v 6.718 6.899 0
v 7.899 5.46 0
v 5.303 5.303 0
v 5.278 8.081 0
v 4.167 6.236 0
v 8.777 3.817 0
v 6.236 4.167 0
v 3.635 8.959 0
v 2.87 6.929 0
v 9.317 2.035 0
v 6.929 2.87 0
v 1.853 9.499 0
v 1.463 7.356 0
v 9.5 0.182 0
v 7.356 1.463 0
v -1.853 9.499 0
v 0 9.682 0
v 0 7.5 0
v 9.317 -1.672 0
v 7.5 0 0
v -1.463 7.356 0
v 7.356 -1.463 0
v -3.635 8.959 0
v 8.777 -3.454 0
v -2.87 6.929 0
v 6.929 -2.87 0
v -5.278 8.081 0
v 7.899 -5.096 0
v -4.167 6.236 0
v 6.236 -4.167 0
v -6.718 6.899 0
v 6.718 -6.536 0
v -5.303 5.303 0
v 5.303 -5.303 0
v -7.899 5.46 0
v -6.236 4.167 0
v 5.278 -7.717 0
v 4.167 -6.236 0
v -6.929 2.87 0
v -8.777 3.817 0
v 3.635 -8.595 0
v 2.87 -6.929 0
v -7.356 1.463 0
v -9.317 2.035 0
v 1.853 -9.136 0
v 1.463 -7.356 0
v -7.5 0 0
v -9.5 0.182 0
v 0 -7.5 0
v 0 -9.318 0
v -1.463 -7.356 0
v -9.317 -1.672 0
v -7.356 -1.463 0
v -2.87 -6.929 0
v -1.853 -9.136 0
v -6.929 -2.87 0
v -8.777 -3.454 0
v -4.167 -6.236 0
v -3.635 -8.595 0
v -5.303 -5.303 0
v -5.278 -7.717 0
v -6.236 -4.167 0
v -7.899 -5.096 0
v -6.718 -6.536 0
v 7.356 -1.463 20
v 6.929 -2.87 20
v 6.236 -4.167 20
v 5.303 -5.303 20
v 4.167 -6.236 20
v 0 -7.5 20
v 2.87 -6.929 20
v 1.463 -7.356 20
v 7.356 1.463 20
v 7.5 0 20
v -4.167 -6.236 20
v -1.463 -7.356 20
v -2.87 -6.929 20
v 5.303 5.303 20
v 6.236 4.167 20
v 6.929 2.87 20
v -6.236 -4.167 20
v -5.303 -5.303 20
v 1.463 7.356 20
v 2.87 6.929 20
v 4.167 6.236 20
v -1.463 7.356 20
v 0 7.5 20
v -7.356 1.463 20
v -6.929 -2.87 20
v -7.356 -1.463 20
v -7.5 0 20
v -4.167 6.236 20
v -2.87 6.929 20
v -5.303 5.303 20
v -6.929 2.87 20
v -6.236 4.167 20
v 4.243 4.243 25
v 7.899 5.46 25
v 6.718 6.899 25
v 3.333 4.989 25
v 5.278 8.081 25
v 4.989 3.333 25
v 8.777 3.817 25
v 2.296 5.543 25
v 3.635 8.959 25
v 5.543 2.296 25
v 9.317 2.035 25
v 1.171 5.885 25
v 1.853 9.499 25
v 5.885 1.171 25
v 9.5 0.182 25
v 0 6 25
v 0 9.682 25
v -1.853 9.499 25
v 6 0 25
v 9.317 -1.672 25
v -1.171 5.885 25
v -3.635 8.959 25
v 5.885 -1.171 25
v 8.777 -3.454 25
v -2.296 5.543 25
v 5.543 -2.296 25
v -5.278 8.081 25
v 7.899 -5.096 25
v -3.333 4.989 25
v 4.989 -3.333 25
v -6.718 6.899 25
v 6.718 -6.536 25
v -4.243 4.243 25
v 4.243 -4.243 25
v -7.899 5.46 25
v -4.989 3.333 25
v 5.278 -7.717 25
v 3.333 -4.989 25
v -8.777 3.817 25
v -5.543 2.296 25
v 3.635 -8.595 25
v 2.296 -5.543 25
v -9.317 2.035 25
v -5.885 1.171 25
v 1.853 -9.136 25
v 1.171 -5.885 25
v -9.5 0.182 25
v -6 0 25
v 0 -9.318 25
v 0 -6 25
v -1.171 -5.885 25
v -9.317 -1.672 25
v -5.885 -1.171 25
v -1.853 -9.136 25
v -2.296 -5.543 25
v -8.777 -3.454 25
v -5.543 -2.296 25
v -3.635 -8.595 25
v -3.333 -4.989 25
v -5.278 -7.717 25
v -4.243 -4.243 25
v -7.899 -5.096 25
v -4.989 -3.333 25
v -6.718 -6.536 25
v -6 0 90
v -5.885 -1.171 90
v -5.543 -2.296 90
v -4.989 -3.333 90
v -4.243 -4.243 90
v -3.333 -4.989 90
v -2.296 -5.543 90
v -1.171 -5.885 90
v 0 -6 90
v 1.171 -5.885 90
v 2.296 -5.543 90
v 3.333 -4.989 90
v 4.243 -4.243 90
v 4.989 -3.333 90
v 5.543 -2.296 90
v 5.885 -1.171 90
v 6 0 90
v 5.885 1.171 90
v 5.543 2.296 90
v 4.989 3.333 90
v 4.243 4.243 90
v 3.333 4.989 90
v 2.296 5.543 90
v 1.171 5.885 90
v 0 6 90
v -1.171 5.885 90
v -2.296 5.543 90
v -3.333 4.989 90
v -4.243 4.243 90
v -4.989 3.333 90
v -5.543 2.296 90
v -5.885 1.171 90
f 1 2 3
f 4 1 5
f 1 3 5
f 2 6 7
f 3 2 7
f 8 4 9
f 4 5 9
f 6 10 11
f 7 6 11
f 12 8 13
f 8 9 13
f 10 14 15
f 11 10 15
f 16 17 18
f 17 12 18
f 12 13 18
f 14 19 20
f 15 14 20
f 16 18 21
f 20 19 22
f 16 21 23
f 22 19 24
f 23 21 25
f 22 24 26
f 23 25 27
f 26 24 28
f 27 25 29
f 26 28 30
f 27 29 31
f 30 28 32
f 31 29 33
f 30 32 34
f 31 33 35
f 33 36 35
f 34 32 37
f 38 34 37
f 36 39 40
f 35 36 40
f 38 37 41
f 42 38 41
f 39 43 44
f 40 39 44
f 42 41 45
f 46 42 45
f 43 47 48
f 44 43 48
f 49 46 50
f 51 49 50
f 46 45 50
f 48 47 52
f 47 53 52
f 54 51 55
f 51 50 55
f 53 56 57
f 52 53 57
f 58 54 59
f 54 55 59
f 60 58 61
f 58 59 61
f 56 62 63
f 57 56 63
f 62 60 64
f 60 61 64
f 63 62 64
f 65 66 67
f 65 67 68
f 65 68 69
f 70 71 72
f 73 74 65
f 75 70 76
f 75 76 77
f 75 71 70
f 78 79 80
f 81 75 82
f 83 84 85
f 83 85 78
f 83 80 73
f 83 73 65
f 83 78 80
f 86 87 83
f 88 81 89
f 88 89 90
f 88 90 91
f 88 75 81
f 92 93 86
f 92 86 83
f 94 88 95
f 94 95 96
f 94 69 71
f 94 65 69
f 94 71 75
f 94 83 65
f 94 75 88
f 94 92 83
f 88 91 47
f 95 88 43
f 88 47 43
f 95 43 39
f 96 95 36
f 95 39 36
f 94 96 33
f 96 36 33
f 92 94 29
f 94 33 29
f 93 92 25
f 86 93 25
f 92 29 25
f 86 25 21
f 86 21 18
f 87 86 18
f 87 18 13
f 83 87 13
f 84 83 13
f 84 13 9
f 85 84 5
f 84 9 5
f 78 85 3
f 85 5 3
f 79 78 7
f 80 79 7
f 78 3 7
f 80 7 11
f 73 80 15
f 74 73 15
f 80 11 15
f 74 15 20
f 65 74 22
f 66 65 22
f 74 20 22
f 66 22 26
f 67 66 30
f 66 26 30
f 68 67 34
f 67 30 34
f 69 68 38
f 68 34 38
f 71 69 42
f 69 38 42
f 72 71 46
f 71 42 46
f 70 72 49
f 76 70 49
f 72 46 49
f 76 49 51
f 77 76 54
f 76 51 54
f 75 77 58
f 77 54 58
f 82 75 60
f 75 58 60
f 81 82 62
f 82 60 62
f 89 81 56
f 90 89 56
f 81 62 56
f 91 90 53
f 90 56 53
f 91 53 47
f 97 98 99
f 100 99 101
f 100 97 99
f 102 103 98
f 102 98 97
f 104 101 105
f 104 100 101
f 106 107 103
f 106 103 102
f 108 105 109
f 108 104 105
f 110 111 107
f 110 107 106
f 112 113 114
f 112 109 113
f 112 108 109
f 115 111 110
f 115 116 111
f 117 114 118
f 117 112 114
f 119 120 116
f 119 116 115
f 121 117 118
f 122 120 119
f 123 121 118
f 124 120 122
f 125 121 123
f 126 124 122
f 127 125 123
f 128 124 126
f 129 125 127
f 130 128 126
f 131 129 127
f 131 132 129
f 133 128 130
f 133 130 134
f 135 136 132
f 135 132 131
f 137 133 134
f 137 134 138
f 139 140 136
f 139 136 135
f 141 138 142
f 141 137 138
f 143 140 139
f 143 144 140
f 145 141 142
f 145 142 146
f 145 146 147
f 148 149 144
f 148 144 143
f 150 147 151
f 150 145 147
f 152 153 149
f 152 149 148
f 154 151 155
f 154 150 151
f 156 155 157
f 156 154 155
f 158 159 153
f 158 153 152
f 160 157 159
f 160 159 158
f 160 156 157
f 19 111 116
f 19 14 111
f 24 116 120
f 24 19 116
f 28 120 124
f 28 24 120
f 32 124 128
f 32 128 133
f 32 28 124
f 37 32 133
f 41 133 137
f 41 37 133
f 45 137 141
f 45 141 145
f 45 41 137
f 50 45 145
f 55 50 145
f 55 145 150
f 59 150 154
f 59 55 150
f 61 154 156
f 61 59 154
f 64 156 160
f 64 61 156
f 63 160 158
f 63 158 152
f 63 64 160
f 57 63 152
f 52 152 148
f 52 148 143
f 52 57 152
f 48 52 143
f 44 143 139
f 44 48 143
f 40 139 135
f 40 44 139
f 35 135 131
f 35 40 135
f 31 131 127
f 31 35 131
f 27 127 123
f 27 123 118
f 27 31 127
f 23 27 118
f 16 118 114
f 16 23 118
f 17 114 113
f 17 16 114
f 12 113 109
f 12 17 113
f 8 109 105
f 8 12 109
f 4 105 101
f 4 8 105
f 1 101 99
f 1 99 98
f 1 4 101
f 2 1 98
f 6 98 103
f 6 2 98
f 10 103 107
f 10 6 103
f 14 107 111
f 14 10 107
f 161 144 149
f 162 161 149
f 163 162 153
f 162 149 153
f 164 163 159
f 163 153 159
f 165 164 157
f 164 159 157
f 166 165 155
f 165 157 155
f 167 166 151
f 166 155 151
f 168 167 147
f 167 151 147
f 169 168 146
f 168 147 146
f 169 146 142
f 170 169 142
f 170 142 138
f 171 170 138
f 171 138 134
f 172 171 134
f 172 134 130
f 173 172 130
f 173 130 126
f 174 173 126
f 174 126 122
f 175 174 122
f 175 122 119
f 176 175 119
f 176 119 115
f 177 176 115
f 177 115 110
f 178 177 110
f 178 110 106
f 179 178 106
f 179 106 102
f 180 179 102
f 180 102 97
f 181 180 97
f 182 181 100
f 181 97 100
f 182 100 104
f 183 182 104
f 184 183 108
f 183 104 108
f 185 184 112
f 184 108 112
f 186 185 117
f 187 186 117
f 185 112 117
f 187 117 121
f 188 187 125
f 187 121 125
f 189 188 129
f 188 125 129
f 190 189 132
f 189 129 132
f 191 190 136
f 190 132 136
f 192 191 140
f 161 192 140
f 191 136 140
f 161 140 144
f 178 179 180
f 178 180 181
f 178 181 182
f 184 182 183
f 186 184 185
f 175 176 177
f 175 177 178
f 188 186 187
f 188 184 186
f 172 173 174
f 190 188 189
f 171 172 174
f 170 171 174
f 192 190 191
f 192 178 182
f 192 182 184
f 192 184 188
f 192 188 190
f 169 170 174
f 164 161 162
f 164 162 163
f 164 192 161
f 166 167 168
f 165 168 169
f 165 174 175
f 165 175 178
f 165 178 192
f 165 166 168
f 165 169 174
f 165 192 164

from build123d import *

# Parameters (mm, degrees)
SKETCH1_R           = 6
BOSS_EXTRUDE1_DEPTH = 90
SKETCH2_W           = 25
SKETCH2_H           = 3.681667676
SKETCH3_R           = 7.5
CUT_EXTRUDE1_DEPTH  = 20


with BuildPart() as part:
    # Sketch1 → Boss-Extrude1 (new body)
    with BuildSketch(Plane.XY):
        with Locations(Location((0, 0, 0), (0, 0, 180))):
            Circle(SKETCH1_R)
    extrude(amount=BOSS_EXTRUDE1_DEPTH)

    # Sketch2 → Revolve1 (revolve)
    with BuildSketch(Plane(origin=(0, 0, 0), x_dir=(0, 0, -1), z_dir=(1, 0, 0)), mode=Mode.PRIVATE) as revolve1_sk:
        with Locations((-12.5, 7.840833838)):
            Rectangle(SKETCH2_W, SKETCH2_H)
    revolve(revolve1_sk.sketch.rotate(Axis((0, 0.181667676, 35.200849853), (0, 0, -1)), 90), axis=Axis((0, 0.181667676, 35.200849853), (0, 0, -1)))

    # Sketch3 → Cut-Extrude1 (cut)
    with BuildSketch(Plane(origin=(0, 0, 0), x_dir=(-1, 0, 0), z_dir=(0, 0, -1))):
        Circle(SKETCH3_R)
    extrude(amount=-CUT_EXTRUDE1_DEPTH, mode=Mode.SUBTRACT)


solid = part.part
